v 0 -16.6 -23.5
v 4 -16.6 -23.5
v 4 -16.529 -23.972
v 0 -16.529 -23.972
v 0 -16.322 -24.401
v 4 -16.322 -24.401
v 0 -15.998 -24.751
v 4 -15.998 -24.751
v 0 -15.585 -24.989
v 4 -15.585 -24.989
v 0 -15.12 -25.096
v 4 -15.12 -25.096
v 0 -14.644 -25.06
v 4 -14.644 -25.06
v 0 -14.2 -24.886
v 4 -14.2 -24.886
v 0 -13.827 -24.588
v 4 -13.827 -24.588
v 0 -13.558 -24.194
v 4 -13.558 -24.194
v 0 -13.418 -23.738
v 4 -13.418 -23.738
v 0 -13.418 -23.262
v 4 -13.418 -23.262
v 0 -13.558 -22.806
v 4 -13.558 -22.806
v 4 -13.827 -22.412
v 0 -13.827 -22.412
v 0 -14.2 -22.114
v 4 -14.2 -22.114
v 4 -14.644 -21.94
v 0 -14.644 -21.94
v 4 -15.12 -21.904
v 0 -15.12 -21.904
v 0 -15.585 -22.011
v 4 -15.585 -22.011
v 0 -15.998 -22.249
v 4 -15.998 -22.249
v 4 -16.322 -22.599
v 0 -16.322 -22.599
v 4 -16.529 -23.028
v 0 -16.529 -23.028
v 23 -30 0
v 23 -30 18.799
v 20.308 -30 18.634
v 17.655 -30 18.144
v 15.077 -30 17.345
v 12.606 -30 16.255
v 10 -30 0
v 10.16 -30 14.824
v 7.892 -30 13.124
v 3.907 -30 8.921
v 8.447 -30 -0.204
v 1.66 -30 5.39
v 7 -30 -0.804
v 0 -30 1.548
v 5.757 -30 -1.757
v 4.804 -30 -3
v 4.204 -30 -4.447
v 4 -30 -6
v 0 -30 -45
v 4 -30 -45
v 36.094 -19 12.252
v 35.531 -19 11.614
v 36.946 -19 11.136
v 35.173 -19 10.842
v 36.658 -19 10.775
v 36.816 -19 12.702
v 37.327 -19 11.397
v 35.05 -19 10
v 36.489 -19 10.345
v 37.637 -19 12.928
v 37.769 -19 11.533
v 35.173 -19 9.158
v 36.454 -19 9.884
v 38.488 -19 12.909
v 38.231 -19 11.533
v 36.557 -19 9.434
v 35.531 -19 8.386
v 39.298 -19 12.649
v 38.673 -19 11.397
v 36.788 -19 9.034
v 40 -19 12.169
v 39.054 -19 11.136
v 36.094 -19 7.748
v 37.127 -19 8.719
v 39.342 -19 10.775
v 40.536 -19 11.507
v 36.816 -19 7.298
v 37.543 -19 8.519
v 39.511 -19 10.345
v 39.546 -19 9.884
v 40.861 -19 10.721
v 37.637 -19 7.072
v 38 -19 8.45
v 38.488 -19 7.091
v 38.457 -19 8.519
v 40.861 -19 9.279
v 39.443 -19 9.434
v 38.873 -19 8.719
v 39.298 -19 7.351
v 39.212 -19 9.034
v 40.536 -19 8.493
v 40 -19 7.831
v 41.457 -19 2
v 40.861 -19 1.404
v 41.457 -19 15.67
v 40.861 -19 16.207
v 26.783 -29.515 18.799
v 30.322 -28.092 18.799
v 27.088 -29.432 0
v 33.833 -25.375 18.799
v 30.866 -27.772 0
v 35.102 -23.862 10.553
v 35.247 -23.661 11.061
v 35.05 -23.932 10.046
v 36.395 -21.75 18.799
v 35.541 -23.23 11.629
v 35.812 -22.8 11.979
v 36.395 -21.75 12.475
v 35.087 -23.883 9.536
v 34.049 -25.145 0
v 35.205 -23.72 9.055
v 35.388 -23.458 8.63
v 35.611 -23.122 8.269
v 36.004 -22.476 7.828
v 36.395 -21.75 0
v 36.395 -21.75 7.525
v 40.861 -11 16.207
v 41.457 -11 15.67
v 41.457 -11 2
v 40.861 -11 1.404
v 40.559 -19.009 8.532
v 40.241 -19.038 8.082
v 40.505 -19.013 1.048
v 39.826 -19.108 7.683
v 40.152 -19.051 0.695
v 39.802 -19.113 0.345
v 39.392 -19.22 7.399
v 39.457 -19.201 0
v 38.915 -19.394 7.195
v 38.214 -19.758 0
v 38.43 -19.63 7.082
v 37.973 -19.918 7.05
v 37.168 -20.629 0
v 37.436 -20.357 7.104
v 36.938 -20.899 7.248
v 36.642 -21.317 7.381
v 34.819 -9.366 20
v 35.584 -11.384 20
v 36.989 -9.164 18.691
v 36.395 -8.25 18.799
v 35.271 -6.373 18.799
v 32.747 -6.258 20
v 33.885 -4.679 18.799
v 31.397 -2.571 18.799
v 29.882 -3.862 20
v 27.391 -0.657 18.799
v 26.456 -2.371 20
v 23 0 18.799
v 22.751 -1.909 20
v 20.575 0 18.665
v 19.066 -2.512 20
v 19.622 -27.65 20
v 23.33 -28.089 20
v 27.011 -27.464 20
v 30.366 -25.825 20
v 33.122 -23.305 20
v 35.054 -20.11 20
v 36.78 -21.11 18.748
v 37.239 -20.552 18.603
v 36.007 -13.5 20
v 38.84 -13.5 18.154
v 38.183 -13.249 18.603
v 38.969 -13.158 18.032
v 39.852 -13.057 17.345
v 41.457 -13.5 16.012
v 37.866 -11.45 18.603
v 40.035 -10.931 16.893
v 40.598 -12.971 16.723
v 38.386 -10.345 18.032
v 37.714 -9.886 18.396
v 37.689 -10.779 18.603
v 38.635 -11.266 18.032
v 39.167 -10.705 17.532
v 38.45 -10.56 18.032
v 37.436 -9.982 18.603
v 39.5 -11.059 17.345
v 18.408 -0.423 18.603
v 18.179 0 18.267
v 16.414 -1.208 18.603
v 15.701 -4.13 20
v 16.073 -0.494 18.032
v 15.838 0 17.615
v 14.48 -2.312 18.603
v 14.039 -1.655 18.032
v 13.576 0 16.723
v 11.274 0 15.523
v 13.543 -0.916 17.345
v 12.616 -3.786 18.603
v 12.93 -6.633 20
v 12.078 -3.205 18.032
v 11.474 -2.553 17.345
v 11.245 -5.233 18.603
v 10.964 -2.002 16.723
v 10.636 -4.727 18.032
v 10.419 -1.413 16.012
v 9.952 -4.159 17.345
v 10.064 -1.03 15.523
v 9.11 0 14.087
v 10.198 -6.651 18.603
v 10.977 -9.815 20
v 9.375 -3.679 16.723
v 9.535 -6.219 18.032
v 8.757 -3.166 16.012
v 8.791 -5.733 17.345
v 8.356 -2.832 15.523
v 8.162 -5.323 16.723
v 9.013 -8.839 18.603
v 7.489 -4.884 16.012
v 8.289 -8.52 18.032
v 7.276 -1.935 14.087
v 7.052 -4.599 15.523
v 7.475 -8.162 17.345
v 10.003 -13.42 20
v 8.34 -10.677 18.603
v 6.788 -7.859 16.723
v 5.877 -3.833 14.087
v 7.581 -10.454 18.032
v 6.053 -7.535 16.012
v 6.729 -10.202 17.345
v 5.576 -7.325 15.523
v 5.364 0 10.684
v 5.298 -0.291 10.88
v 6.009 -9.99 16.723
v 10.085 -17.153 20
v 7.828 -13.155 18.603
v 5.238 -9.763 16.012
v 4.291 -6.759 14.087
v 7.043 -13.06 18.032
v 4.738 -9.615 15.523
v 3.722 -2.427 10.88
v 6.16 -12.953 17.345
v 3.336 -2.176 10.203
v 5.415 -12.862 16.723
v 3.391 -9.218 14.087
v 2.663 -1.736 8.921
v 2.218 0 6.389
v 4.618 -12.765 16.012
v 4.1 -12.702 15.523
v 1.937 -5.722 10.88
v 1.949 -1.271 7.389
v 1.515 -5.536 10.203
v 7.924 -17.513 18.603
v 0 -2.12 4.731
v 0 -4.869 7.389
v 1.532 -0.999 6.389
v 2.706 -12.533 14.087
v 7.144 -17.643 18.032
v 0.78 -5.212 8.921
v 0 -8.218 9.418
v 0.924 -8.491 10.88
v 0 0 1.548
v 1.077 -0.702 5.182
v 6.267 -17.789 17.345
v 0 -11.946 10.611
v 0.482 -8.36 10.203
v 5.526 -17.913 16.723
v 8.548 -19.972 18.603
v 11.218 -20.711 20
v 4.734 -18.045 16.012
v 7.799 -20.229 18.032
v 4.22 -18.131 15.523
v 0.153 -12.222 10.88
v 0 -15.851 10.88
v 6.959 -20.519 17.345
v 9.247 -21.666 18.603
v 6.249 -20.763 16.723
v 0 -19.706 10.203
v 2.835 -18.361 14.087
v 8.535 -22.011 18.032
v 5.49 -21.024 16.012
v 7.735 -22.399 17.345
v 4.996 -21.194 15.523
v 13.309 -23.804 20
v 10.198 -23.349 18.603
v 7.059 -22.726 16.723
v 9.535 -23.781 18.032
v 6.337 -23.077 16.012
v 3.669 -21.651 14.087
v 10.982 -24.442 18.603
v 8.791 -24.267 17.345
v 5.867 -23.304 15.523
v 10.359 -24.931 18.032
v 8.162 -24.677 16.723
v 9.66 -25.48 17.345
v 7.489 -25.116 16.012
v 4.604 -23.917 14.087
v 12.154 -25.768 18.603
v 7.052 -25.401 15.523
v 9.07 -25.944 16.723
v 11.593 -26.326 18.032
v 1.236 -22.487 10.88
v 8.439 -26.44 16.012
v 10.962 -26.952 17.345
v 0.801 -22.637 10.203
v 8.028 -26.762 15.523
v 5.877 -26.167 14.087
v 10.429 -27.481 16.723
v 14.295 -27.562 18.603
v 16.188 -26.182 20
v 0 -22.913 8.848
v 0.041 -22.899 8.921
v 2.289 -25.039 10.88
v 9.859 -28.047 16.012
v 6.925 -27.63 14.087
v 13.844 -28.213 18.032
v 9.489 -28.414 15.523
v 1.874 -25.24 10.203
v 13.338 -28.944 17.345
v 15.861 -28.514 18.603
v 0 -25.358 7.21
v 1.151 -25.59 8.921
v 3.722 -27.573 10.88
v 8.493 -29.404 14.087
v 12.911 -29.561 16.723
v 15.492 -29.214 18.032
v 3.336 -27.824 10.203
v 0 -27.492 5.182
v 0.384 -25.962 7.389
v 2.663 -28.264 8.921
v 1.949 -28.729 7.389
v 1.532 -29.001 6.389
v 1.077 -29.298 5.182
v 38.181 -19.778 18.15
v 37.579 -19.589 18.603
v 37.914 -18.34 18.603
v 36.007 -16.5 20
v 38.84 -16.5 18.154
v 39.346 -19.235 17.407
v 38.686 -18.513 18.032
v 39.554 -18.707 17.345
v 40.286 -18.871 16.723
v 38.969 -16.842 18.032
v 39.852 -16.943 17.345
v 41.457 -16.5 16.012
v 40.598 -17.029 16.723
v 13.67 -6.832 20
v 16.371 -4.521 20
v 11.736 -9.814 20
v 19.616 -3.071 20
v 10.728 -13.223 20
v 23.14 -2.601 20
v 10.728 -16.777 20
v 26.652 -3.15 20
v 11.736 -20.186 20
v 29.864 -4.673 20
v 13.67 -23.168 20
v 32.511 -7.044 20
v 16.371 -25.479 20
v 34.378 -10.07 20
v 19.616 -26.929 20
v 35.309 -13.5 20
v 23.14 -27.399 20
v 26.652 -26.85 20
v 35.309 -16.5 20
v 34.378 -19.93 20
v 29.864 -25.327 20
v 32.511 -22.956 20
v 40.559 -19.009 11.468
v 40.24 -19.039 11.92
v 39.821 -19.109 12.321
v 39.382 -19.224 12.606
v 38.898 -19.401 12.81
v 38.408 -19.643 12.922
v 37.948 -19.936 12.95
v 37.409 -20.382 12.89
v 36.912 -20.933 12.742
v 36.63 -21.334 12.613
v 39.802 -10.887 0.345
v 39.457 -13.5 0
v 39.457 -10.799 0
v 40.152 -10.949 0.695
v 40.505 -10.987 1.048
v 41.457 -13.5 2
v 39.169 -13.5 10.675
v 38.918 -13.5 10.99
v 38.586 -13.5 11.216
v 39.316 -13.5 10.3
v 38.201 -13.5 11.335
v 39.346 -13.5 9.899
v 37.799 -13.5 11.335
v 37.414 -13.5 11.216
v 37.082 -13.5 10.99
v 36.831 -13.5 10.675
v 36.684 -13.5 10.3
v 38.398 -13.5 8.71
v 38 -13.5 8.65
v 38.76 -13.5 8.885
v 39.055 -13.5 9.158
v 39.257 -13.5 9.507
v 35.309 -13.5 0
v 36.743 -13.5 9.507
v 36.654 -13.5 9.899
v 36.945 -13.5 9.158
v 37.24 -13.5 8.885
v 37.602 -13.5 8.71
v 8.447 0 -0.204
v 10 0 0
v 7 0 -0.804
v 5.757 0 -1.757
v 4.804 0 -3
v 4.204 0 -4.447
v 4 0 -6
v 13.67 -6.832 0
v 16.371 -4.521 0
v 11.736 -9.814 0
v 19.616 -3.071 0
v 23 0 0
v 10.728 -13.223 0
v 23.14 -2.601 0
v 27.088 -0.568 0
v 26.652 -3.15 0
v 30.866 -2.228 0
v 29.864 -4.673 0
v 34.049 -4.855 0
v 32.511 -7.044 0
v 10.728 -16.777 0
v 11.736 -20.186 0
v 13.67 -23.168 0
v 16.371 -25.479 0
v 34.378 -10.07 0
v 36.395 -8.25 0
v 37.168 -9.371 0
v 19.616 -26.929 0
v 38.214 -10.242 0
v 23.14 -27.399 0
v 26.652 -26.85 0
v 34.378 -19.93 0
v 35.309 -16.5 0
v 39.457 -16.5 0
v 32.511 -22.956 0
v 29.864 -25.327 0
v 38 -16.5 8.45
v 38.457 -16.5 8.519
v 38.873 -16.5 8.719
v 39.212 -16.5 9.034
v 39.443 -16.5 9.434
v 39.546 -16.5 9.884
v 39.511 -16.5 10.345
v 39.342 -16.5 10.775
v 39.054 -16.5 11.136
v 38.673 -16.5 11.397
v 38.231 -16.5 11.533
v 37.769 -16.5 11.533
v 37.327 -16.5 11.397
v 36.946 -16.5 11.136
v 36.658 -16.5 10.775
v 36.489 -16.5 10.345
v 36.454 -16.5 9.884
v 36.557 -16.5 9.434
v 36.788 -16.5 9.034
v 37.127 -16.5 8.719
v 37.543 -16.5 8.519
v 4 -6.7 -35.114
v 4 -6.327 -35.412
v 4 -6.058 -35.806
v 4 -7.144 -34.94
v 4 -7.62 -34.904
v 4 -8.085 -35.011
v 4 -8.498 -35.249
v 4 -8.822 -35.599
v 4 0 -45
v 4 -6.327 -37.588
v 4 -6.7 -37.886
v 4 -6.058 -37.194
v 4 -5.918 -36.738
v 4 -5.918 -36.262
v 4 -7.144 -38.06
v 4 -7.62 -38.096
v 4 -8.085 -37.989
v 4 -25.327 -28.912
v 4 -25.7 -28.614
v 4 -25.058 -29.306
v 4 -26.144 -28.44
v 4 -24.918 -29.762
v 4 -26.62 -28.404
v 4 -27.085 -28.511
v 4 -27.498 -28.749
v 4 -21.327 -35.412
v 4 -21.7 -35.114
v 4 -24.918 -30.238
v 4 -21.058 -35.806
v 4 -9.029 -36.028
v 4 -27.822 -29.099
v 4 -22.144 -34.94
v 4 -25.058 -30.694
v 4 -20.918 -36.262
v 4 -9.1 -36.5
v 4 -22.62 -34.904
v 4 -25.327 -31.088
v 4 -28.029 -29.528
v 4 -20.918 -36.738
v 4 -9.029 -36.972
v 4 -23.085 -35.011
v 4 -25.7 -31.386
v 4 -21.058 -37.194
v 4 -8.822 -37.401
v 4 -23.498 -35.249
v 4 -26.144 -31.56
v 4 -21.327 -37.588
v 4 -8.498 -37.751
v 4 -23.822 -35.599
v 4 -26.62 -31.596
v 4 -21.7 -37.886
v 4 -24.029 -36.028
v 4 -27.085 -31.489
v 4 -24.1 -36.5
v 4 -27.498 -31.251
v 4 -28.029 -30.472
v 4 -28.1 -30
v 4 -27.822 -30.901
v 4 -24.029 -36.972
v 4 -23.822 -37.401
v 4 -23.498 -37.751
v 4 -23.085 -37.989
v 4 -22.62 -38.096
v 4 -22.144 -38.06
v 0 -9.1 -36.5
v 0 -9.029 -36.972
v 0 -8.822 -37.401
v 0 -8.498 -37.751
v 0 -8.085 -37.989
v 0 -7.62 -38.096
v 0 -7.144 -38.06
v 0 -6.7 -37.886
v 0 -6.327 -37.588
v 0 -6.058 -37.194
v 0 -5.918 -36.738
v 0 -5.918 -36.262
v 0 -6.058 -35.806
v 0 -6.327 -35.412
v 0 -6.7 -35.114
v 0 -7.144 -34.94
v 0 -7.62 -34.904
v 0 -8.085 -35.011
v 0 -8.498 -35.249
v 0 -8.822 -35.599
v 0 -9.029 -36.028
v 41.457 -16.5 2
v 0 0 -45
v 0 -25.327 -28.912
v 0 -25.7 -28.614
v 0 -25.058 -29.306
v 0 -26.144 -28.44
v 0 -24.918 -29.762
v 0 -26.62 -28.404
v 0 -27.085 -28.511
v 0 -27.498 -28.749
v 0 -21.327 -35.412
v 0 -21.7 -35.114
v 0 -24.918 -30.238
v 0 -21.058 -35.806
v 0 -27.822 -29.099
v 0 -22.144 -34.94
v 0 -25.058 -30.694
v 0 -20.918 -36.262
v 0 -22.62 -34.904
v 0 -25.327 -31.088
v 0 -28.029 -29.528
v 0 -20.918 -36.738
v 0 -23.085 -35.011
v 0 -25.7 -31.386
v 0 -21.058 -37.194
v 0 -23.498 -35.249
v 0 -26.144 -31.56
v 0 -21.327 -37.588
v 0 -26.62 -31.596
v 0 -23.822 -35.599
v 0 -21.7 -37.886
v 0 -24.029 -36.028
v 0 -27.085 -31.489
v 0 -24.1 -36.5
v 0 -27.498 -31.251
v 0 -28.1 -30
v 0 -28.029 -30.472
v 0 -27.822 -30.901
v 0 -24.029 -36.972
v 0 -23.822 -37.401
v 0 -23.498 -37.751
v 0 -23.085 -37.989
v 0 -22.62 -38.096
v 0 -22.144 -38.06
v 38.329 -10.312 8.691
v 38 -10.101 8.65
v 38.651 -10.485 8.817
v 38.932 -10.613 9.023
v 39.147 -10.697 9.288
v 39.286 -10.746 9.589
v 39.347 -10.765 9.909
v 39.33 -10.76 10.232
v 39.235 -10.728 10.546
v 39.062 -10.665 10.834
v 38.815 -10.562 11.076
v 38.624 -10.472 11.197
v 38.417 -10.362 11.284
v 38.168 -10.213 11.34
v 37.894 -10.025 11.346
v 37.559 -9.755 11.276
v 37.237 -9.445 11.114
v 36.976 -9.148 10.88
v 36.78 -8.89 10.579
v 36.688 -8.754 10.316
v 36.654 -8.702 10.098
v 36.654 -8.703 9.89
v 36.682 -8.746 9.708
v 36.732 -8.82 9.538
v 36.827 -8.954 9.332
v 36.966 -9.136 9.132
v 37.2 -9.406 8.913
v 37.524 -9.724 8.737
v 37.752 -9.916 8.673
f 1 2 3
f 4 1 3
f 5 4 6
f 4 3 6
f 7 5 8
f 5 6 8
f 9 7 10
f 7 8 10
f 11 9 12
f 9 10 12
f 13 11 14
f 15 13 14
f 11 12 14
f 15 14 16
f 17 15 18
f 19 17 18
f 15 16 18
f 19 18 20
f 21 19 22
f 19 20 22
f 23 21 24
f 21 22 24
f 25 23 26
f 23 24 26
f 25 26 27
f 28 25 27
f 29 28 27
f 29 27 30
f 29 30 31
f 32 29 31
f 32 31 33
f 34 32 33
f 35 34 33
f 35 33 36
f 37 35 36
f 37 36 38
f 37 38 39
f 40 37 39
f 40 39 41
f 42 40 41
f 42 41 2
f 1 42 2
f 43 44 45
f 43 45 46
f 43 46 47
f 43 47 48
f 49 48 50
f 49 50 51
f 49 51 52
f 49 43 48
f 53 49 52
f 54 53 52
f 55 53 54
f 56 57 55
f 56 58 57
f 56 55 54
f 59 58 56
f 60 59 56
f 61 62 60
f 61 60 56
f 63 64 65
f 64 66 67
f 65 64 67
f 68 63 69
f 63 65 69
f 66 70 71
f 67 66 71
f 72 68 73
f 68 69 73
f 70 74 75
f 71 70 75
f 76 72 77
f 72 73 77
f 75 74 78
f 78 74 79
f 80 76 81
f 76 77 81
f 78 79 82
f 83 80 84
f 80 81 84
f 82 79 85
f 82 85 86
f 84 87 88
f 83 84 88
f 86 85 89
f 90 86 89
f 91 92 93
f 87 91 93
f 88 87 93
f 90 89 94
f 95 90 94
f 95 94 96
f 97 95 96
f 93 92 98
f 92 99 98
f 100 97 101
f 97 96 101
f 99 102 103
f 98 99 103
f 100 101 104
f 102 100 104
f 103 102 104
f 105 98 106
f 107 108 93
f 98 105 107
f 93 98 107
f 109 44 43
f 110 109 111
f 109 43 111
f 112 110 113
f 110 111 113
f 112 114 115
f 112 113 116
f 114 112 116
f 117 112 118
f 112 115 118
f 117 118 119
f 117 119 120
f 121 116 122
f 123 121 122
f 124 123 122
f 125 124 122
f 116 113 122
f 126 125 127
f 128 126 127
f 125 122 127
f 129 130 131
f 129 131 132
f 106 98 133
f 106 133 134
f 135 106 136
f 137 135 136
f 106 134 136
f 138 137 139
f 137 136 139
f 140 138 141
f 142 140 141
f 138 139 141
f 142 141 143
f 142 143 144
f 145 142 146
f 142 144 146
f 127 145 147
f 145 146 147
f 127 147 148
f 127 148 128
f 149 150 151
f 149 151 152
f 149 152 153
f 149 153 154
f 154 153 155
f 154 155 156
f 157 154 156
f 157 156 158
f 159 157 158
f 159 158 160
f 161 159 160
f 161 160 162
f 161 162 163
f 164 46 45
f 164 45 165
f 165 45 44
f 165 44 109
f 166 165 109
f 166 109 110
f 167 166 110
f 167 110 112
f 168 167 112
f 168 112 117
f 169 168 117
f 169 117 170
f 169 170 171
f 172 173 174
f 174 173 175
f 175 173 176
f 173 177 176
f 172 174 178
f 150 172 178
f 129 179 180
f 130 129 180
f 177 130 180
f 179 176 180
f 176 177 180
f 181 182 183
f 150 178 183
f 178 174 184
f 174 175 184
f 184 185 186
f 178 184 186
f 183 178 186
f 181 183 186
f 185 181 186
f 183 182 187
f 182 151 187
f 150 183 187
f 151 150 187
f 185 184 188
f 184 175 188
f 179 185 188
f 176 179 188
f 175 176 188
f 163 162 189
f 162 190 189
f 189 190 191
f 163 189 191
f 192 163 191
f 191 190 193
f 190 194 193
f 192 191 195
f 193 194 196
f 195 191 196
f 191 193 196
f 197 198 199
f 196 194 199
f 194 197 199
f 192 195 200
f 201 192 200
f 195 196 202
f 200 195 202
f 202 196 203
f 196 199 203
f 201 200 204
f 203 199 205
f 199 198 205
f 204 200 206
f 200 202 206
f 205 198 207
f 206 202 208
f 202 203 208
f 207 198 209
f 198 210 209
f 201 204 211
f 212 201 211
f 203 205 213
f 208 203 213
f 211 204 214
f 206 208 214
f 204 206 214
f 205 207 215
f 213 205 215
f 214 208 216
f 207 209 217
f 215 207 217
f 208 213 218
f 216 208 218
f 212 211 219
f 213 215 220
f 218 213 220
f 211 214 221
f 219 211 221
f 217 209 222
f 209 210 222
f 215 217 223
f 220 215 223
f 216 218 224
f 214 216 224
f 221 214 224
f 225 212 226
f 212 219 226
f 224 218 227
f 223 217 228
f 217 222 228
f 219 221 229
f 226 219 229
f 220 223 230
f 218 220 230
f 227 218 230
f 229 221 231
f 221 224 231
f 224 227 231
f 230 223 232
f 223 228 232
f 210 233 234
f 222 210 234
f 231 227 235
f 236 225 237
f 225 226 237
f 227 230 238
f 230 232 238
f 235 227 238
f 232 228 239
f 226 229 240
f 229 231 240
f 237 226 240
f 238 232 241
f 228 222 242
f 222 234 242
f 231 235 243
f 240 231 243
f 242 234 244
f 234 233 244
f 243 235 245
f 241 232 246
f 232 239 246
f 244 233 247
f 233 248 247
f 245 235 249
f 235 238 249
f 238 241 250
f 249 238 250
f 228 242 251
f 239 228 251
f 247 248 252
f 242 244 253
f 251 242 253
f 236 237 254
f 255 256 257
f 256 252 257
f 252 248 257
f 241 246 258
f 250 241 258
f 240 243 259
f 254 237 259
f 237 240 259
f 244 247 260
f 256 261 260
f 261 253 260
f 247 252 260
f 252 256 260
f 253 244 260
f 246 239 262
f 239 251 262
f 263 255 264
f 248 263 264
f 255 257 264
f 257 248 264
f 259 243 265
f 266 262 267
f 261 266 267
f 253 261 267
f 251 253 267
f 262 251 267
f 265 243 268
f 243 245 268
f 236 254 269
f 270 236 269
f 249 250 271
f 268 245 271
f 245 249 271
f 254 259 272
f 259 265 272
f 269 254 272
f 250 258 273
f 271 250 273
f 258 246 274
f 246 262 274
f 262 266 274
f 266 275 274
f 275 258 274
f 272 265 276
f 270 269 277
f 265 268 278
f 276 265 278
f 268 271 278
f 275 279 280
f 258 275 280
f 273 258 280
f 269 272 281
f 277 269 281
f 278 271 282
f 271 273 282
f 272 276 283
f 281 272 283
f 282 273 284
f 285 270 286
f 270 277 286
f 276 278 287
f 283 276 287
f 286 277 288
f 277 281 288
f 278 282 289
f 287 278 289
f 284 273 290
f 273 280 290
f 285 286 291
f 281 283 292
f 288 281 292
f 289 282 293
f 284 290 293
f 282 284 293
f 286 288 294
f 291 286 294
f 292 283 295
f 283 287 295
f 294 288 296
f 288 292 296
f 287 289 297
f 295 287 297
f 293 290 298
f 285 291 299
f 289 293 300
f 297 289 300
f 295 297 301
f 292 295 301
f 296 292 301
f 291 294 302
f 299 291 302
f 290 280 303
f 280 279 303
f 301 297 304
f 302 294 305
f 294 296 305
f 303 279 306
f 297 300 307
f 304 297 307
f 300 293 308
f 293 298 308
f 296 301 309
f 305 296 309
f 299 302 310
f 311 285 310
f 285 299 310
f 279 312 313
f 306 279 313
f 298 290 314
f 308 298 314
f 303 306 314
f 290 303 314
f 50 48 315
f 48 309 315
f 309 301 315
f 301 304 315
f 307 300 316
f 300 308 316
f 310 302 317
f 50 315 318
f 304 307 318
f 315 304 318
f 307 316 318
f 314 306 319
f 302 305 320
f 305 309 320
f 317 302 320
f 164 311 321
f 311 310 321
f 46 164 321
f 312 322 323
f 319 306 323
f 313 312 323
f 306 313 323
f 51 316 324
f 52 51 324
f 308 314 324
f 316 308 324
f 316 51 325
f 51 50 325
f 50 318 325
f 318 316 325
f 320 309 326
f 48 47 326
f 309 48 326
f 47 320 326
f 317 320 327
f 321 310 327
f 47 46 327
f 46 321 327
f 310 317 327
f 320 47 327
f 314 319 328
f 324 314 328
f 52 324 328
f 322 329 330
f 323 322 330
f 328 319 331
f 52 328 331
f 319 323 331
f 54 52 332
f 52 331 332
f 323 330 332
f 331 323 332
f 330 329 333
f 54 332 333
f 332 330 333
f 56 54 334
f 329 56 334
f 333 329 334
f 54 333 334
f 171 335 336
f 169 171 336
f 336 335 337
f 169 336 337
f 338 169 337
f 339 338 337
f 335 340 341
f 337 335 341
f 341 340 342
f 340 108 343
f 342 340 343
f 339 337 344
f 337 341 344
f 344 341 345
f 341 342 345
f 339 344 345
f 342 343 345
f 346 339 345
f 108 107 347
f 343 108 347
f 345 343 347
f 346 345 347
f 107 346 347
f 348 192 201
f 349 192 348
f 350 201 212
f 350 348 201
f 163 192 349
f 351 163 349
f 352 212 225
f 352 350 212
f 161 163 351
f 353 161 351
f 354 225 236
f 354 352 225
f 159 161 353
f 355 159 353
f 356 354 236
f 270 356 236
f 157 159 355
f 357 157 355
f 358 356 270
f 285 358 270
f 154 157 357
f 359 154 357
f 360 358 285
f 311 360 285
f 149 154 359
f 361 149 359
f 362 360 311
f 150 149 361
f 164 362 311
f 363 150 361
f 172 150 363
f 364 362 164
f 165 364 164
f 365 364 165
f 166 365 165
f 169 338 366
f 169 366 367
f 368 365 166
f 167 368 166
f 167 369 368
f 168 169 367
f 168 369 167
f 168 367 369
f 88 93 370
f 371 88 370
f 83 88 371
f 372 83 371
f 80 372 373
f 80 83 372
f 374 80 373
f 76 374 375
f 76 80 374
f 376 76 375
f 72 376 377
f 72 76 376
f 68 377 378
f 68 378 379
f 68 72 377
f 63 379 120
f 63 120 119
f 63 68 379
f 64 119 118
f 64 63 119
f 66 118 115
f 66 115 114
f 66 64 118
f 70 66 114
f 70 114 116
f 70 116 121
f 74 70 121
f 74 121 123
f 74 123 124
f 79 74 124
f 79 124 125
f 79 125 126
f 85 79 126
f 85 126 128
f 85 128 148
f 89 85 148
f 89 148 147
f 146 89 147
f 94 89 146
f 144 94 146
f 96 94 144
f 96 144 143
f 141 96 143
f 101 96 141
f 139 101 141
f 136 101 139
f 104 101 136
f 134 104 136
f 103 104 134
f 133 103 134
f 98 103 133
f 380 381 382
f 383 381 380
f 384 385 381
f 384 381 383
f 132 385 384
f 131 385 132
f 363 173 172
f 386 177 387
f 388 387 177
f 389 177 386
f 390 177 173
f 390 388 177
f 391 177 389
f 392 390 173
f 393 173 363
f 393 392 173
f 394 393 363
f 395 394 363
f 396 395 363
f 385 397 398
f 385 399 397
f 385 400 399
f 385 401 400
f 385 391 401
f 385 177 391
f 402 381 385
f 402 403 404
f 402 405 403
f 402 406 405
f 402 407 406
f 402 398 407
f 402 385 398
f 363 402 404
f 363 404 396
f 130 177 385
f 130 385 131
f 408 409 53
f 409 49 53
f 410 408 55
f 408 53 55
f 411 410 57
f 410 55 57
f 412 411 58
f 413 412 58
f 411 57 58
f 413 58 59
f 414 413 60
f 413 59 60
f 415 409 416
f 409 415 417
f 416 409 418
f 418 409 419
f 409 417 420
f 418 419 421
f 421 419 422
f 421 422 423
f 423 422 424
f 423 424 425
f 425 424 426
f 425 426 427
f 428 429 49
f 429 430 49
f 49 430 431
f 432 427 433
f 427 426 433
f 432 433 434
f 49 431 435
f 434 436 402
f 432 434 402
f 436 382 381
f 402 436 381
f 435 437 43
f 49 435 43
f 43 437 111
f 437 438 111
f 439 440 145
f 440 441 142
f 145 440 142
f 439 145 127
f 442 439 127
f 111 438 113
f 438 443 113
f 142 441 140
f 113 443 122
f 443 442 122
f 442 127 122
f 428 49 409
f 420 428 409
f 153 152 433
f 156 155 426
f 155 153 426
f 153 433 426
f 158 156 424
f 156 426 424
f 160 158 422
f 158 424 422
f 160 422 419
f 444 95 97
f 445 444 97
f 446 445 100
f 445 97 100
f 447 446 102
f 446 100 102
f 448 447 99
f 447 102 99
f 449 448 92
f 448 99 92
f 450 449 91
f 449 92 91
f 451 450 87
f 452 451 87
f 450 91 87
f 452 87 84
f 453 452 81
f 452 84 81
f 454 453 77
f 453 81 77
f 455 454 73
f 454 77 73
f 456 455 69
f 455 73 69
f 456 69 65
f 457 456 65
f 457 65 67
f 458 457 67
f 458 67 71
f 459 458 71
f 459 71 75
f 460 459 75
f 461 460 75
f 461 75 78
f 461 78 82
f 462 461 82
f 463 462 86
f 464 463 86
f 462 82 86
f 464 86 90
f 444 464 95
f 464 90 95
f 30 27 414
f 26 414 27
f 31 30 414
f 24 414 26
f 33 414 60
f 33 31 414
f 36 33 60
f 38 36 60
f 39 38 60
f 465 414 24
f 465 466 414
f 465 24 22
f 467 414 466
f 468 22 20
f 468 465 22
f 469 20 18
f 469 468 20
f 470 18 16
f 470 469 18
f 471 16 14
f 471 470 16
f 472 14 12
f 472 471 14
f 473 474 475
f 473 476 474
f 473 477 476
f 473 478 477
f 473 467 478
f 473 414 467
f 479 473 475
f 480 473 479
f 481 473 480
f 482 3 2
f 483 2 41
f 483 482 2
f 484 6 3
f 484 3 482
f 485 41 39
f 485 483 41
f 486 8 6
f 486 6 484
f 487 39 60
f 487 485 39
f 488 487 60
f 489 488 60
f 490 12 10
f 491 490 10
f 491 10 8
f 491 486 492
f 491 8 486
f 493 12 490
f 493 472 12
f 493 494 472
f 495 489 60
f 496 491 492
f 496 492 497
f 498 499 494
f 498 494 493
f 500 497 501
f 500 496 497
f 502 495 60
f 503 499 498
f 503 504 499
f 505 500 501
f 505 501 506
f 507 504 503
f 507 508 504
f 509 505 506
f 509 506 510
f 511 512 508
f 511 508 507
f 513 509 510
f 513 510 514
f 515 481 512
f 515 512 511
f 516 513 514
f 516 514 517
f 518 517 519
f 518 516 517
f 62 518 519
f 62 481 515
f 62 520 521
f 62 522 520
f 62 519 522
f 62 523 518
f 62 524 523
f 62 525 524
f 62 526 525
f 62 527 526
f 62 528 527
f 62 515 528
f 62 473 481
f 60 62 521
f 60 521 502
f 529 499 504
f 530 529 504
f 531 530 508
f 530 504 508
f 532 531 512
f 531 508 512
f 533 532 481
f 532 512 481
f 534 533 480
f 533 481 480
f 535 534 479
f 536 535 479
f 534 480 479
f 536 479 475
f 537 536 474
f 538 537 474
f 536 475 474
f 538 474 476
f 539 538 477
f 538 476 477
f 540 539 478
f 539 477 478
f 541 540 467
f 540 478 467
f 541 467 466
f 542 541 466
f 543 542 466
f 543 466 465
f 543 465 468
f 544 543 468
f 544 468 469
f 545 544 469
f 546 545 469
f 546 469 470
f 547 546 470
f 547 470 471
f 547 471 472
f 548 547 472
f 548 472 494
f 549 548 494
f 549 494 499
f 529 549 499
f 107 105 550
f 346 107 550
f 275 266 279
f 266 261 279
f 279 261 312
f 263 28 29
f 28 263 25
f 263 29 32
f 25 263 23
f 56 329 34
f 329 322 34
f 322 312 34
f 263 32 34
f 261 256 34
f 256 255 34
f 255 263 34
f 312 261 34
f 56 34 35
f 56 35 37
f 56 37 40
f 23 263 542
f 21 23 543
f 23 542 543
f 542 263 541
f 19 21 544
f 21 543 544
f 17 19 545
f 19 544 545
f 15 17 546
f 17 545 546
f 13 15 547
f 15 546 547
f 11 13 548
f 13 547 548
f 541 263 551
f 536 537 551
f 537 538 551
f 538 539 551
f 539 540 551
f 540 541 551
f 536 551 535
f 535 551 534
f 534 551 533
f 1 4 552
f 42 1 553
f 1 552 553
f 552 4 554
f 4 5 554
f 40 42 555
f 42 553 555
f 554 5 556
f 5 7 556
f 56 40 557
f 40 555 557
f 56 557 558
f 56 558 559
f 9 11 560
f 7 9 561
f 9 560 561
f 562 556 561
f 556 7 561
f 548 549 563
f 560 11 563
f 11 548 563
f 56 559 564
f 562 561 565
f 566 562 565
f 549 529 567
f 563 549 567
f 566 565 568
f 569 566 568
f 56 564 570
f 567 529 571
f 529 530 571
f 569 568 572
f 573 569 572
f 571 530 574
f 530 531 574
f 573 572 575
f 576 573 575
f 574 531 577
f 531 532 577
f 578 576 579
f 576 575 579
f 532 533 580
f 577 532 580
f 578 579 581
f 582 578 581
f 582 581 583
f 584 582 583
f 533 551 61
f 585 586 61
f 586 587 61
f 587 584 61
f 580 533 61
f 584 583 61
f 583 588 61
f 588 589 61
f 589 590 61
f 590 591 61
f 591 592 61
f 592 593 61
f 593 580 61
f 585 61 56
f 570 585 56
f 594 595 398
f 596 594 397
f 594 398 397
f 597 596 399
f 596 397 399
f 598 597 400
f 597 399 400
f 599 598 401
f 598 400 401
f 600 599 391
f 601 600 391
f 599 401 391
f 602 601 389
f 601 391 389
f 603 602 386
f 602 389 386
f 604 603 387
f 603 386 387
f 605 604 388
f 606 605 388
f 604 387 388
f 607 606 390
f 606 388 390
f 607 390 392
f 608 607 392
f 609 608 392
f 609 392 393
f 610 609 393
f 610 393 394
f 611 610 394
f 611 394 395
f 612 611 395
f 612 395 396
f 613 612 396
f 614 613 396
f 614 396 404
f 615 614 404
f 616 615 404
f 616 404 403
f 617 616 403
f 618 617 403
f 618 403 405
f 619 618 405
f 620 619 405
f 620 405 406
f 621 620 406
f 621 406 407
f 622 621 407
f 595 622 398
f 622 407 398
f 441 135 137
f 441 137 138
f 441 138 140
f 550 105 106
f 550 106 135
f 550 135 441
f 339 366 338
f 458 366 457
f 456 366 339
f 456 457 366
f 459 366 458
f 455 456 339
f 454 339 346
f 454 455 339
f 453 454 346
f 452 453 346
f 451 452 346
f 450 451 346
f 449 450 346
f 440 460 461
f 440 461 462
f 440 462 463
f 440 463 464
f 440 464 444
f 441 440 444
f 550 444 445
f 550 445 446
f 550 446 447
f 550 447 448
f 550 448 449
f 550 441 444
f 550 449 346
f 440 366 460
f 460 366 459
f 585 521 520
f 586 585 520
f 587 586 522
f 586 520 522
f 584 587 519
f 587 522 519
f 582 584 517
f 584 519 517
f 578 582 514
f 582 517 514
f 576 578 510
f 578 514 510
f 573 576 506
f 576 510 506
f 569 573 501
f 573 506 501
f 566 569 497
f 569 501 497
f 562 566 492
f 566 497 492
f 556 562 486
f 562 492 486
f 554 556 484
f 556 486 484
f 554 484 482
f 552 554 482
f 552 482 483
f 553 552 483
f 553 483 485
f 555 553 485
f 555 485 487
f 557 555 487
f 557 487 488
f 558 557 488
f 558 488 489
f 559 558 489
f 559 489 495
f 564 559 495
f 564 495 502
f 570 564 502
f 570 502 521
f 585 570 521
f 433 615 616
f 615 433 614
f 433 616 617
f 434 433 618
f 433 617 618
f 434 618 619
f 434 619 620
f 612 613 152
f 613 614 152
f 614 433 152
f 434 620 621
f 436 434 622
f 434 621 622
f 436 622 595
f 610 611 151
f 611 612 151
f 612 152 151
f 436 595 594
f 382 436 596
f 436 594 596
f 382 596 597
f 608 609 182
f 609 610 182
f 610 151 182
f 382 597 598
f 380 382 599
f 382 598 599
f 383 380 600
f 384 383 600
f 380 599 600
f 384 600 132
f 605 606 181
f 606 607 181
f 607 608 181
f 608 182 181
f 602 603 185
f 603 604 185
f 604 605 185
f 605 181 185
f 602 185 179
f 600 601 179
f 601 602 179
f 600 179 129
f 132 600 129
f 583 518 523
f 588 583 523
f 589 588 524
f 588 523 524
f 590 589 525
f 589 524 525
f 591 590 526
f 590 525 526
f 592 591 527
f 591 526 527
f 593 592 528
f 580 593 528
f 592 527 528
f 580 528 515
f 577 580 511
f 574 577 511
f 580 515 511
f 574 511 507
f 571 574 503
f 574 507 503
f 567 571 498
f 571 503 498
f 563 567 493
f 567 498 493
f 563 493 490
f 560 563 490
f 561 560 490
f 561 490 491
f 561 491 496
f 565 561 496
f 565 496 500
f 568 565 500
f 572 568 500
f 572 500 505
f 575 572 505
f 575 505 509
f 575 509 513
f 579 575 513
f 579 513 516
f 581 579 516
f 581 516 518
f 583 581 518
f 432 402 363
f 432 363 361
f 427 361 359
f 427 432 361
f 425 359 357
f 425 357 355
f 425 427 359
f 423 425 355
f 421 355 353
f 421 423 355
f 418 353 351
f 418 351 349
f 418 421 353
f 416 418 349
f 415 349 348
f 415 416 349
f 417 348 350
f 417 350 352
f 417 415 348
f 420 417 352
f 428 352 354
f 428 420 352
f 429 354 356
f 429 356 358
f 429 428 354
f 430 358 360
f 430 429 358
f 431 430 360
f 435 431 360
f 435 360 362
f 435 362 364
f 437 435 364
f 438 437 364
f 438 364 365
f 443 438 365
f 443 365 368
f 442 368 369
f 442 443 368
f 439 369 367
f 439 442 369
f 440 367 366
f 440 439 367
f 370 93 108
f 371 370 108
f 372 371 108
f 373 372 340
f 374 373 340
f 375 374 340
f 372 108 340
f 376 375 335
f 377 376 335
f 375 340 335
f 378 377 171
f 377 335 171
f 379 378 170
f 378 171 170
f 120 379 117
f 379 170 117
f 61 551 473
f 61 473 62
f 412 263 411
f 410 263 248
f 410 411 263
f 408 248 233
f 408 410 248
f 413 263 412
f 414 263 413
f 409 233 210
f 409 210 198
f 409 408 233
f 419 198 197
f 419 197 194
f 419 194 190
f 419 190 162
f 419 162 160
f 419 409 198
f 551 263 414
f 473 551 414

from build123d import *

# Parameters (mm, degrees)
SKETCH152_W             = 30
SKETCH152_H             = 45
PAD076_DEPTH            = 4
PAD077_DEPTH            = 20
SKETCH159_R             = 1.6
POCKET059_DEPTH         = 5
FILLET_R                = 6
CHAMFER_SIZE            = 2
FILLET001_R             = 5
SKETCH_R                = 1.35
POCKET_DEPTH            = 19.001
POCKET_DEPTH_BACK       = -11.001
SKETCH165_R             = 2.95
POCKET060_DEPTH         = 5
SKETCH166_R             = 1.55
POCKET061_DEPTH         = 2.5
BODY061_ROLL_ANGLE      = -90
BODY061_PLACEMENT_ANGLE = -90


with BuildPart() as part:
    # Sketch152 → Pad076 (new body)
    with BuildSketch(Plane.XY):
        with Locations((15, 22.5)):
            Rectangle(SKETCH152_W, SKETCH152_H)
    extrude(amount=PAD076_DEPTH)

    # Sketch153 (on Face1 of Pad076) → Pad077 (join)
    with BuildSketch(Plane.XZ):
        with BuildLine():
            ThreePointArc((30, 22.999996), (26.937338, 32.08295), (19, 37.456832))
            Line((19, 37.456832), (19, 41.456832))
            Line((19, 41.456832), (16.5, 41.456832))
            Line((16.5, 35.30894), (16.5, 41.456832))
            ThreePointArc((13.5, 35.30894), (15, 10.6), (16.5, 35.30894))
            Line((13.5, 41.456832), (13.5, 35.30894))
            Line((13.5, 41.456832), (11, 41.456832))
            Line((11, 41.456832), (11, 37.456832))
            ThreePointArc((11, 37.456832), (3.062664, 32.082951), (0, 23))
            Line((0, 0), (0, 23))
            Line((0, 0), (30, 0))
            Line((30, 22.999996), (30, 0))
        make_face()
    extrude(amount=PAD077_DEPTH)

    # Sketch159 → Pocket059 (cut)
    with BuildSketch(Plane.XY.offset(4)):
        with Locations((7.5, 36.5)):
            Circle(SKETCH159_R)
        with Locations((15, 23.5)):
            Circle(SKETCH159_R)
        with Locations((22.5, 36.5)):
            Circle(SKETCH159_R)
        with Locations((26.5, 30)):
            Circle(SKETCH159_R)
    extrude(amount=-POCKET059_DEPTH, mode=Mode.SUBTRACT)

    # Sketch164 (on DatumPlane) → Groove (revolve, cut)
    with BuildSketch(Plane(origin=(15, 0, 0), x_dir=(0, -1, 0), z_dir=(-1, 0, 0))):
        with BuildLine():
            Line((42.60314, 23.220009), (24.100682, 23.220009))
            ThreePointArc((24.100682, 23.220009), (15.81151, 41.734328), (-2.093555, 51.268426))
            Line((-2.093555, 59.264427), (-2.093555, 51.268426))
            Line((-2.093555, 59.264427), (35.073817, 59.264427))
            Line((42.60314, 23.220009), (35.073817, 59.264427))
        make_face()
    revolve(axis=Axis((15, 0, 22.999996), (0, -1, 0)), mode=Mode.SUBTRACT)

    # Fillet
    fillet_edges = [part.edges().sort_by_distance(p)[0] for p in [
        (15, 0, 4),
    ]]
    fillet(fillet_edges, radius=FILLET_R)

    # Chamfer
    chamfer_edges = [part.edges().sort_by_distance(p)[0] for p in [
        (12.25, 0, 41.456832),
        (17.75, 0, 41.456832),
    ]]
    chamfer(chamfer_edges, length=CHAMFER_SIZE)

    # Fillet001
    fillet001_edges = [part.edges().sort_by_distance(p)[0] for p in [
        (11, -9.399365, 37.456832),
        (19, -9.399365, 37.456832),
    ]]
    fillet(fillet001_edges, radius=FILLET001_R)

    # Sketch (on Face23 of Fillet001) → Pocket (cut, two sides)
    with BuildSketch(Plane.YZ.offset(19)) as pocket_sk:
        with Locations((-10, 38)):
            Circle(SKETCH_R)
    extrude(amount=-POCKET_DEPTH, mode=Mode.SUBTRACT)
    extrude(pocket_sk.sketch, amount=-POCKET_DEPTH_BACK, mode=Mode.SUBTRACT)

    # Sketch165 (on Face25 of Pocket) → Pocket060 (cut)
    with BuildSketch(Plane.YZ.offset(19)):
        with Locations((-10, 38)):
            Circle(SKETCH165_R)
    extrude(amount=POCKET060_DEPTH, mode=Mode.SUBTRACT)

    # Sketch166 (on Face31 of Pocket060) → Pocket061 (cut)
    with BuildSketch(Plane.YZ.offset(19)):
        with Locations((-10, 38)):
            Circle(SKETCH166_R)
    extrude(amount=-POCKET061_DEPTH, mode=Mode.SUBTRACT)


with BuildPart() as part_1:
    # Body061 roll: moved
    add(part.part.rotate(Axis((0, 0, 0), (1, 0, 0)), BODY061_ROLL_ANGLE))


with BuildPart() as part_2:
    # Body061 placement: moved
    add(part_1.part.rotate(Axis((0, 0, 0), (0, 0, 1)), BODY061_PLACEMENT_ANGLE))


solid = part_2.part
